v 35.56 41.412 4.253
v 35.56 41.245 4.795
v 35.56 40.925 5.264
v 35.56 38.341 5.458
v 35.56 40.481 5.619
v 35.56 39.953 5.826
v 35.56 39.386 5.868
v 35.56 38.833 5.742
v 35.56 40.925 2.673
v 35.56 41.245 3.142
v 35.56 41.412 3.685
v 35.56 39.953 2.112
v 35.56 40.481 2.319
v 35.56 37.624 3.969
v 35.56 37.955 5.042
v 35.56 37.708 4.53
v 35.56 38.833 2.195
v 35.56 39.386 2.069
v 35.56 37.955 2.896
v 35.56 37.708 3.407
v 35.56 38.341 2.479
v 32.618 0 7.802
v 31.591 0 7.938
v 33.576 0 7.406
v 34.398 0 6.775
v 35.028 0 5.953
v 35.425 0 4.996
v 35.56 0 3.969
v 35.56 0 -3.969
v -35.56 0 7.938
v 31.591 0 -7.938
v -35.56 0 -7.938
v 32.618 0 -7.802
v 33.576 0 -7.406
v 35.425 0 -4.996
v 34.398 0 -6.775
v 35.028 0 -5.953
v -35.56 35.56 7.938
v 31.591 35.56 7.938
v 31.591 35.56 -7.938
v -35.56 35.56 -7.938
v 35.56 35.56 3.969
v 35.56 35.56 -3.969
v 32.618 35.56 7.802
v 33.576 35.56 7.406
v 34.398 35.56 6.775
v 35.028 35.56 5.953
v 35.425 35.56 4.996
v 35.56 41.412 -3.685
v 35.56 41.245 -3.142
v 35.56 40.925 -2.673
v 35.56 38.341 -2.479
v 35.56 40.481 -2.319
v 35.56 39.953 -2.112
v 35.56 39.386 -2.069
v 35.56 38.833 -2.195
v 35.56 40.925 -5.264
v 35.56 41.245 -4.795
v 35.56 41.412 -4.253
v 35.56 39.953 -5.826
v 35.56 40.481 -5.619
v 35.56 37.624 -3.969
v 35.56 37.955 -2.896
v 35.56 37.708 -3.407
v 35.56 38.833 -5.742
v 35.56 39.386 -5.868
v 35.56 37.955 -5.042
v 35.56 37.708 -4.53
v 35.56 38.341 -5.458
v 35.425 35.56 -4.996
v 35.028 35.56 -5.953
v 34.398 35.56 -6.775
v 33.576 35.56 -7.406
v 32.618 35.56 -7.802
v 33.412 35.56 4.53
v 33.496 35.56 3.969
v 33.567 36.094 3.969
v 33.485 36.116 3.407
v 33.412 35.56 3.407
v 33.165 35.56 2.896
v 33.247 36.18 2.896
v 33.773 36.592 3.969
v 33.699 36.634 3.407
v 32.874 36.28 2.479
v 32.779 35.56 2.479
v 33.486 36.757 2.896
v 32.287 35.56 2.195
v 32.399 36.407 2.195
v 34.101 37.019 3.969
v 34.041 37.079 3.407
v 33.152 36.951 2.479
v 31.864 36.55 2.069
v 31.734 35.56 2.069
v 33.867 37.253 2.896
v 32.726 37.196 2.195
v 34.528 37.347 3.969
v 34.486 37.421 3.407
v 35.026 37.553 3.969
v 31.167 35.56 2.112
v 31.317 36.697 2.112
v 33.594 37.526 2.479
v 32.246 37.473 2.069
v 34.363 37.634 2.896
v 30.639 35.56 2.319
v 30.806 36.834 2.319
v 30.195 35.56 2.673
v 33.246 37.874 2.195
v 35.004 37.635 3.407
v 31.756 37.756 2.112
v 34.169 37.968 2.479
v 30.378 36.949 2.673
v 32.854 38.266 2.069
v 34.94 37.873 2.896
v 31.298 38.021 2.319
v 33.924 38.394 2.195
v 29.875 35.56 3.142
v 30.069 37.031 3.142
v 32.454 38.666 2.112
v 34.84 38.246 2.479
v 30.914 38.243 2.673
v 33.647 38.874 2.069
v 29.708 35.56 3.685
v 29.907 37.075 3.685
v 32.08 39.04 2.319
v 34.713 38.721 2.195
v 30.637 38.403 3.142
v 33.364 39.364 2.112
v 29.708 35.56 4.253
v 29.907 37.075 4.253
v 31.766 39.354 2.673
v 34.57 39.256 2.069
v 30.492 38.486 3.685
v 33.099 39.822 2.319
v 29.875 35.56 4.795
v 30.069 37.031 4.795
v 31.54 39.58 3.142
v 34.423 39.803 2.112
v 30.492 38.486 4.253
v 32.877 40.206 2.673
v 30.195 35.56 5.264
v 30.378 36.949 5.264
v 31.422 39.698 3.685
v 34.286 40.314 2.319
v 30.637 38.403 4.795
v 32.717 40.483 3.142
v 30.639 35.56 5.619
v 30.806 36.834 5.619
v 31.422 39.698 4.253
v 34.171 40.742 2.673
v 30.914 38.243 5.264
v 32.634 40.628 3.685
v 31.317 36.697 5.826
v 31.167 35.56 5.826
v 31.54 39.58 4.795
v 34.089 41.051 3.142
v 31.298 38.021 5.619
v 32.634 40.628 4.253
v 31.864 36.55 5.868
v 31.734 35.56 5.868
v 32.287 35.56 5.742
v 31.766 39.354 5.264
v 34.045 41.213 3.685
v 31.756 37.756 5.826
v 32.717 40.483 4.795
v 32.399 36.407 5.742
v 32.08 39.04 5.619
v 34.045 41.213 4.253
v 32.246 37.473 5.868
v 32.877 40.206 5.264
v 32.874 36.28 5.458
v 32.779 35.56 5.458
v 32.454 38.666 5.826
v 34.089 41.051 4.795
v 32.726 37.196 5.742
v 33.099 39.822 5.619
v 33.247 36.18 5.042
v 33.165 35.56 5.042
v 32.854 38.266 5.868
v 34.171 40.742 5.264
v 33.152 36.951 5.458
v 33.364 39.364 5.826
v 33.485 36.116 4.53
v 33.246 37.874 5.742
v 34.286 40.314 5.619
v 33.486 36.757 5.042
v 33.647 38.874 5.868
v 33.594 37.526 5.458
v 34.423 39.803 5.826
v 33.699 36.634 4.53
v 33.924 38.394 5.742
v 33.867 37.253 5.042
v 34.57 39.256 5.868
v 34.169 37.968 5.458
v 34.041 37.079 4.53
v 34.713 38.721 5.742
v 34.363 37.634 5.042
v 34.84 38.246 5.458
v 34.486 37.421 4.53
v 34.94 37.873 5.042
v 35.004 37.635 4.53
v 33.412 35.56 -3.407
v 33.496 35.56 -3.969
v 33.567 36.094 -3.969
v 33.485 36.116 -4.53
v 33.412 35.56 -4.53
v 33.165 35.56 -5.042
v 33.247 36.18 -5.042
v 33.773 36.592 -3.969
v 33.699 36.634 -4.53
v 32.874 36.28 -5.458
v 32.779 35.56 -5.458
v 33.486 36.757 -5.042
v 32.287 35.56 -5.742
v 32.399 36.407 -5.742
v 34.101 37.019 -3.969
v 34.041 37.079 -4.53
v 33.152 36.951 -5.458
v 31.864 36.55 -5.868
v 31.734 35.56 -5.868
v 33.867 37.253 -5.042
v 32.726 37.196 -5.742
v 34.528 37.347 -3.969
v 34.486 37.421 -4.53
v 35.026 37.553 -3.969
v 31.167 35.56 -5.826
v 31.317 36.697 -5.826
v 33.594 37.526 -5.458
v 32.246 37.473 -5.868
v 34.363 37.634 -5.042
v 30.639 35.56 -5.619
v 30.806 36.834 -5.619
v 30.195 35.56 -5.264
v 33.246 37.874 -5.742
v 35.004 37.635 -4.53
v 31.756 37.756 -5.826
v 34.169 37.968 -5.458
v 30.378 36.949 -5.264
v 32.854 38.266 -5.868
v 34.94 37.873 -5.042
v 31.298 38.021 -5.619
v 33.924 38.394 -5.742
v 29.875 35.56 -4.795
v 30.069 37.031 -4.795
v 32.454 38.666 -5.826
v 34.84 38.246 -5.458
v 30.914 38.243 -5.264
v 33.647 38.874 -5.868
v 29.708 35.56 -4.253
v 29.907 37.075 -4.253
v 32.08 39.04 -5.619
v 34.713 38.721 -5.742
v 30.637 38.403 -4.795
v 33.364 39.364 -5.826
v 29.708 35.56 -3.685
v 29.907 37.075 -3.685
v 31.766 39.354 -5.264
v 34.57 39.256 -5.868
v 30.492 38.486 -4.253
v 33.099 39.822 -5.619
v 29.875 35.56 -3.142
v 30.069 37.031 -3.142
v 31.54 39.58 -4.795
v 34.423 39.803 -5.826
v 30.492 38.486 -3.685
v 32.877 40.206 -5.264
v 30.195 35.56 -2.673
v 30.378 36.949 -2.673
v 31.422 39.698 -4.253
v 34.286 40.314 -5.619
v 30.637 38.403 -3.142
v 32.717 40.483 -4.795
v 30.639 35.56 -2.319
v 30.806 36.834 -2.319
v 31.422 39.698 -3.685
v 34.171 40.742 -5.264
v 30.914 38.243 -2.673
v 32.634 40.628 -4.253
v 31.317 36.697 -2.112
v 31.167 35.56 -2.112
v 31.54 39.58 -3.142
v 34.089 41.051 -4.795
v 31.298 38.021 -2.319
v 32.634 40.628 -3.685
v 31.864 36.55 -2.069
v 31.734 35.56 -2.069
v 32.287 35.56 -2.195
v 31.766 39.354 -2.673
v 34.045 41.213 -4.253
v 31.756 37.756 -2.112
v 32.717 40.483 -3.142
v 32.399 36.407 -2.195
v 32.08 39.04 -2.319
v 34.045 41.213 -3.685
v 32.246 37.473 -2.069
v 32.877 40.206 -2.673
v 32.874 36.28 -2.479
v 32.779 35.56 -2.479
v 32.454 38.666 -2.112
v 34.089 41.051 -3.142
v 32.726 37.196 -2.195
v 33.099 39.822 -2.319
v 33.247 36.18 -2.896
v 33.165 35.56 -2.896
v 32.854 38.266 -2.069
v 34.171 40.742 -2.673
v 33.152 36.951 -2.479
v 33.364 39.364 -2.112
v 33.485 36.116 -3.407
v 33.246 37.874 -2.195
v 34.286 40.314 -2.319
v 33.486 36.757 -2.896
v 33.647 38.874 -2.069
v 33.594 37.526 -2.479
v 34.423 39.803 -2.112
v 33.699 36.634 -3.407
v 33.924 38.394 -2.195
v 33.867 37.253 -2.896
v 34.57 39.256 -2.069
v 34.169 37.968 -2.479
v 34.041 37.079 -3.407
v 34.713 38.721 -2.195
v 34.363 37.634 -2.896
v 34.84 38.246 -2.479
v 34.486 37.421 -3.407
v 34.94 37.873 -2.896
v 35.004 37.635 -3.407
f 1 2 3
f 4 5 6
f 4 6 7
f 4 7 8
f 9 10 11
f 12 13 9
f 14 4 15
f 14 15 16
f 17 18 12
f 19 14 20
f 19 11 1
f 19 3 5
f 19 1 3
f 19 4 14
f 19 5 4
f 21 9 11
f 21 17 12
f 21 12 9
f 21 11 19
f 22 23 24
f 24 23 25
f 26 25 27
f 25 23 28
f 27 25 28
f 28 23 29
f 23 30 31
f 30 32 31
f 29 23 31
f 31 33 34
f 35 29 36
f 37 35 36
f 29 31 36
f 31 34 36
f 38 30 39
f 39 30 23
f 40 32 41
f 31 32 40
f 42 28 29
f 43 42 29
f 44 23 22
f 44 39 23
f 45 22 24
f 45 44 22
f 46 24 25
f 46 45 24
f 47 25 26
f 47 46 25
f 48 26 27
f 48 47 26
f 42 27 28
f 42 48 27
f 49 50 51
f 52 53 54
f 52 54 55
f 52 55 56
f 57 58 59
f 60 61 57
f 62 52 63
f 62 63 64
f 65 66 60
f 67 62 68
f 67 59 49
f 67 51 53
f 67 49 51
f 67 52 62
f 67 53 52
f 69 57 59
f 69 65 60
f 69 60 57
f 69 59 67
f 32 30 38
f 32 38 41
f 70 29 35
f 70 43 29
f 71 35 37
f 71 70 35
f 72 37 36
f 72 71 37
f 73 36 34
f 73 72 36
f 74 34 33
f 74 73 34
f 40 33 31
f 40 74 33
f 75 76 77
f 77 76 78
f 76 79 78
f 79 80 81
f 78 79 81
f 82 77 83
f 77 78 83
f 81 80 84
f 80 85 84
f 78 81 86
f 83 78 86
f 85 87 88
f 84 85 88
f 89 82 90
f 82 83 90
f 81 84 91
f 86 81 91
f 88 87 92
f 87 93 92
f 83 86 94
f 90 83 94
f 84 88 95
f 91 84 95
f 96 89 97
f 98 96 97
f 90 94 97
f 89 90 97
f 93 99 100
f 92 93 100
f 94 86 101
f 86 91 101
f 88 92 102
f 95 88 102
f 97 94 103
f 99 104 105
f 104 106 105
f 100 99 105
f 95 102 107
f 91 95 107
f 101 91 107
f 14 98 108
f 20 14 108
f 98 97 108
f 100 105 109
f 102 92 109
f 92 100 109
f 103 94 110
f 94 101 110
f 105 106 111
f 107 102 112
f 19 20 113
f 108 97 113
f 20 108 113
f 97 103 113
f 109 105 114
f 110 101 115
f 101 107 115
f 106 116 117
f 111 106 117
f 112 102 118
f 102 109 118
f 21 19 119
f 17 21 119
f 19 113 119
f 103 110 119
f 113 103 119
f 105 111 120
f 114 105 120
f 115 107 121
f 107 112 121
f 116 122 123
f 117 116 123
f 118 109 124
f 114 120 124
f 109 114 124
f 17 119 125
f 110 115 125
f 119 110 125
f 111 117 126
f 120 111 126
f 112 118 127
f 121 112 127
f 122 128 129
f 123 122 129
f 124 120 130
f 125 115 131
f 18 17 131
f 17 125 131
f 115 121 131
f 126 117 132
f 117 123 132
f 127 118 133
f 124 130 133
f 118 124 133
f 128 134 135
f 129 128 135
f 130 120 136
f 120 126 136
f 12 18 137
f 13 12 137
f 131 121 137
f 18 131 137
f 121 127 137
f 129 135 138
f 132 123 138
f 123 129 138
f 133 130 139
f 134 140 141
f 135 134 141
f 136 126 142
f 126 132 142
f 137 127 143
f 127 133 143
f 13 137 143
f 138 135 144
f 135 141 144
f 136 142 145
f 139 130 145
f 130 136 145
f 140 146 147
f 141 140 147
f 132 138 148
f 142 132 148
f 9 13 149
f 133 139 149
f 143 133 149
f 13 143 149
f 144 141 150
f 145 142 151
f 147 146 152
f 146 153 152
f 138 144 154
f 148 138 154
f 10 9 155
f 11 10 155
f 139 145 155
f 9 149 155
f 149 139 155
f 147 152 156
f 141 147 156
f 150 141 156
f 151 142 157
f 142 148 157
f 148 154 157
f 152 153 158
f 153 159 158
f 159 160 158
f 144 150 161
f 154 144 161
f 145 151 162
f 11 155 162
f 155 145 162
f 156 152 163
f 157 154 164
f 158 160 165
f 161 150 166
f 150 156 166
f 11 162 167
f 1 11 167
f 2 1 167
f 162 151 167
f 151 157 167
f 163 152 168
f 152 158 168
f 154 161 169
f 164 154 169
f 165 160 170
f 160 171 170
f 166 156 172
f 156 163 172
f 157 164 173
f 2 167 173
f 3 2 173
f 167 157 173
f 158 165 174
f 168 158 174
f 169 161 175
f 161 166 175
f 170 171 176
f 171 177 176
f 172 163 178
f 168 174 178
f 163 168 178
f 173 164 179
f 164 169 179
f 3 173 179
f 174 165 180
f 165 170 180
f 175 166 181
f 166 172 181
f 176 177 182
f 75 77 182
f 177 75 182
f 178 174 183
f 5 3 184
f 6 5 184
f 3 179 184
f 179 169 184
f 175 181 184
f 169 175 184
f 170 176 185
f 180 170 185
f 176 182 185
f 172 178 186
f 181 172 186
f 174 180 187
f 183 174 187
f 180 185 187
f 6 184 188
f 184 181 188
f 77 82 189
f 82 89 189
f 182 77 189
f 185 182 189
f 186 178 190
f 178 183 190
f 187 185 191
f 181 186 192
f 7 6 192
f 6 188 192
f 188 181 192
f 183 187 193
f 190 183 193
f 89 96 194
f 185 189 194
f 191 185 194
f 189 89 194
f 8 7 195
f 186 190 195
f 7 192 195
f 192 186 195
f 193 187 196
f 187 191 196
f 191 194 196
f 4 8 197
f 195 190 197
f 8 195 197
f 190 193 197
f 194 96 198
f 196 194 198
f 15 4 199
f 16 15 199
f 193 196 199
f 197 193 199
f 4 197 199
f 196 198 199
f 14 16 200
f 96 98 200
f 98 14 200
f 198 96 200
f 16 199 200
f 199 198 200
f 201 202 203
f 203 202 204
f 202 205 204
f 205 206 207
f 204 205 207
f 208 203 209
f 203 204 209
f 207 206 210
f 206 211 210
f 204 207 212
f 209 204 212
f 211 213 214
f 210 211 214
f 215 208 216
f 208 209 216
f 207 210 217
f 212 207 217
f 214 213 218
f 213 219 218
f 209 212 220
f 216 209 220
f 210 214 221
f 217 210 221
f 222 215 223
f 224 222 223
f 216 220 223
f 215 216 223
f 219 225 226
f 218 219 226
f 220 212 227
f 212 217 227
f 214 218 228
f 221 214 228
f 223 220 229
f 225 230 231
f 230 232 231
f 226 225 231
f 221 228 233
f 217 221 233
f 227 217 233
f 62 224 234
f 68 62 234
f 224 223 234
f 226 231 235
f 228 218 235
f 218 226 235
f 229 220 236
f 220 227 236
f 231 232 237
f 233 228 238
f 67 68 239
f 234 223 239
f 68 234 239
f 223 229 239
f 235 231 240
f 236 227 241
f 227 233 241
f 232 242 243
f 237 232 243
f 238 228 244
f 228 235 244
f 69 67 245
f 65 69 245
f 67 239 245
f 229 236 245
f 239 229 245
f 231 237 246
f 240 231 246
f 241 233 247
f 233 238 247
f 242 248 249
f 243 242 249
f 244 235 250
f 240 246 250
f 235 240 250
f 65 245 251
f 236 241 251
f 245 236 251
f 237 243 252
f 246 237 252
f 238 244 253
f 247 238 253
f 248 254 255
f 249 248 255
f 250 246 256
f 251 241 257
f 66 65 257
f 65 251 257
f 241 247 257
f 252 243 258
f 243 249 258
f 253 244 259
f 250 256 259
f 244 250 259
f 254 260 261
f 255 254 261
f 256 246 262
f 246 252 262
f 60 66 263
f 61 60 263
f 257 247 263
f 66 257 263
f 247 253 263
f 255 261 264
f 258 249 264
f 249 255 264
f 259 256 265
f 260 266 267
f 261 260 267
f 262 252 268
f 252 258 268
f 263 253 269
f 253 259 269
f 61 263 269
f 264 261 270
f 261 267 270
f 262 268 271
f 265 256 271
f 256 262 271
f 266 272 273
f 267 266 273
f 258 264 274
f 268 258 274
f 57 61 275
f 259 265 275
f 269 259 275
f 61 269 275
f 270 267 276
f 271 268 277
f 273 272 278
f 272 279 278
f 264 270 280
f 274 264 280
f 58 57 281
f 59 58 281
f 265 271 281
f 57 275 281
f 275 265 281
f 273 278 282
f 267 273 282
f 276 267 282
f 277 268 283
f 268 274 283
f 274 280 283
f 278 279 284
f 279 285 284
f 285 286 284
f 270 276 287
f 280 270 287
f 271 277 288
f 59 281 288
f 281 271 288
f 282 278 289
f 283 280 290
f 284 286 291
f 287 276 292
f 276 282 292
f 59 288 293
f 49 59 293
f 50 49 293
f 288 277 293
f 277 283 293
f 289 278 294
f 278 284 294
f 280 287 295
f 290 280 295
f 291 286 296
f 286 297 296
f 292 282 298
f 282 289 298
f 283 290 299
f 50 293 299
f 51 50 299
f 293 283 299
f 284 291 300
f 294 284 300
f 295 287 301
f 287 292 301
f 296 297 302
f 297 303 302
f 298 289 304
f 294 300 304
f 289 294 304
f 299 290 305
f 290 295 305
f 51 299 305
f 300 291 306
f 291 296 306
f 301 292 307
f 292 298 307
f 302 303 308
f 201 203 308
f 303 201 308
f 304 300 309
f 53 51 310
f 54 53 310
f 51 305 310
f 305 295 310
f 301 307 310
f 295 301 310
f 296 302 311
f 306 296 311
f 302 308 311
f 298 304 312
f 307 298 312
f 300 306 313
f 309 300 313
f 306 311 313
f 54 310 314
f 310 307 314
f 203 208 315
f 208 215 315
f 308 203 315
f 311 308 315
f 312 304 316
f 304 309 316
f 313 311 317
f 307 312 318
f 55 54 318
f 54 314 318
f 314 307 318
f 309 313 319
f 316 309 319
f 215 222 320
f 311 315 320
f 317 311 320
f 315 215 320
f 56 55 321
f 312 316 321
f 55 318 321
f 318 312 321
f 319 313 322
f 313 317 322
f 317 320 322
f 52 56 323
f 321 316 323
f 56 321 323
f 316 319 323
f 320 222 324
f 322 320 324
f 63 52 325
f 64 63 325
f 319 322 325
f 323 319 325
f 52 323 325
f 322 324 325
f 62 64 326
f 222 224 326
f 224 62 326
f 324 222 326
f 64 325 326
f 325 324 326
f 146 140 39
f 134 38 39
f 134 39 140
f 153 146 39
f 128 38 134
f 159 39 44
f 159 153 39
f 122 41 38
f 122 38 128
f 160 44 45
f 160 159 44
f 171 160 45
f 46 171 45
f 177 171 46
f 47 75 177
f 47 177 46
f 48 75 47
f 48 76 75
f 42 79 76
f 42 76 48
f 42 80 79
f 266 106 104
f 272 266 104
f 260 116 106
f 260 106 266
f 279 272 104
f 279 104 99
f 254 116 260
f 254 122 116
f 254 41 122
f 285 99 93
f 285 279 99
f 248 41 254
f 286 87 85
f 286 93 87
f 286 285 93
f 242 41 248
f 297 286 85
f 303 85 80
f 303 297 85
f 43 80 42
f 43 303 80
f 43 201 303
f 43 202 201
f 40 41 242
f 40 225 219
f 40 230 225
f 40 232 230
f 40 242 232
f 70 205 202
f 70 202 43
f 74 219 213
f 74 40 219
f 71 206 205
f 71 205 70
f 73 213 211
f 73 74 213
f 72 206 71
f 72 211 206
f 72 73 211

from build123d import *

# Parameters (mm, degrees)
SKETCH2_W           = 71.12
SKETCH2_H           = 15.875
BOSS_EXTRUDE1_DEPTH = 35.56
FILLET1_R           = 3.96875
SKETCH3_R           = 1.905
REVOLVE1_ANGLE      = 90


with BuildPart() as part:
    # Sketch2 → Boss-Extrude1 (new body)
    with BuildSketch(Plane(origin=(0, 0, 0), x_dir=(1, 0, 0), z_dir=(0, 1, 0))):
        Rectangle(SKETCH2_W, SKETCH2_H)
    extrude(amount=BOSS_EXTRUDE1_DEPTH)

    # Fillet1
    fillet1_edges = [part.edges().sort_by_distance(p)[0] for p in [
        (35.56, 17.78, 7.9375),
        (35.56, 17.78, -7.9375),
    ]]
    fillet(fillet1_edges, radius=FILLET1_R)

    # Sketch3 → Revolve1 (revolve)
    with BuildSketch(Plane(origin=(0, 35.56, 0), x_dir=(1, 0, 0), z_dir=(0, 1, 0))):
        with Locations((31.59125, -3.96875)):
            Circle(SKETCH3_R)
        with Locations((31.59125, 3.96875)):
            Circle(SKETCH3_R)
    revolve(axis=Axis((35.56, 35.56, -7.9375), (0, 0, -1)), revolution_arc=REVOLVE1_ANGLE)


solid = part.part
